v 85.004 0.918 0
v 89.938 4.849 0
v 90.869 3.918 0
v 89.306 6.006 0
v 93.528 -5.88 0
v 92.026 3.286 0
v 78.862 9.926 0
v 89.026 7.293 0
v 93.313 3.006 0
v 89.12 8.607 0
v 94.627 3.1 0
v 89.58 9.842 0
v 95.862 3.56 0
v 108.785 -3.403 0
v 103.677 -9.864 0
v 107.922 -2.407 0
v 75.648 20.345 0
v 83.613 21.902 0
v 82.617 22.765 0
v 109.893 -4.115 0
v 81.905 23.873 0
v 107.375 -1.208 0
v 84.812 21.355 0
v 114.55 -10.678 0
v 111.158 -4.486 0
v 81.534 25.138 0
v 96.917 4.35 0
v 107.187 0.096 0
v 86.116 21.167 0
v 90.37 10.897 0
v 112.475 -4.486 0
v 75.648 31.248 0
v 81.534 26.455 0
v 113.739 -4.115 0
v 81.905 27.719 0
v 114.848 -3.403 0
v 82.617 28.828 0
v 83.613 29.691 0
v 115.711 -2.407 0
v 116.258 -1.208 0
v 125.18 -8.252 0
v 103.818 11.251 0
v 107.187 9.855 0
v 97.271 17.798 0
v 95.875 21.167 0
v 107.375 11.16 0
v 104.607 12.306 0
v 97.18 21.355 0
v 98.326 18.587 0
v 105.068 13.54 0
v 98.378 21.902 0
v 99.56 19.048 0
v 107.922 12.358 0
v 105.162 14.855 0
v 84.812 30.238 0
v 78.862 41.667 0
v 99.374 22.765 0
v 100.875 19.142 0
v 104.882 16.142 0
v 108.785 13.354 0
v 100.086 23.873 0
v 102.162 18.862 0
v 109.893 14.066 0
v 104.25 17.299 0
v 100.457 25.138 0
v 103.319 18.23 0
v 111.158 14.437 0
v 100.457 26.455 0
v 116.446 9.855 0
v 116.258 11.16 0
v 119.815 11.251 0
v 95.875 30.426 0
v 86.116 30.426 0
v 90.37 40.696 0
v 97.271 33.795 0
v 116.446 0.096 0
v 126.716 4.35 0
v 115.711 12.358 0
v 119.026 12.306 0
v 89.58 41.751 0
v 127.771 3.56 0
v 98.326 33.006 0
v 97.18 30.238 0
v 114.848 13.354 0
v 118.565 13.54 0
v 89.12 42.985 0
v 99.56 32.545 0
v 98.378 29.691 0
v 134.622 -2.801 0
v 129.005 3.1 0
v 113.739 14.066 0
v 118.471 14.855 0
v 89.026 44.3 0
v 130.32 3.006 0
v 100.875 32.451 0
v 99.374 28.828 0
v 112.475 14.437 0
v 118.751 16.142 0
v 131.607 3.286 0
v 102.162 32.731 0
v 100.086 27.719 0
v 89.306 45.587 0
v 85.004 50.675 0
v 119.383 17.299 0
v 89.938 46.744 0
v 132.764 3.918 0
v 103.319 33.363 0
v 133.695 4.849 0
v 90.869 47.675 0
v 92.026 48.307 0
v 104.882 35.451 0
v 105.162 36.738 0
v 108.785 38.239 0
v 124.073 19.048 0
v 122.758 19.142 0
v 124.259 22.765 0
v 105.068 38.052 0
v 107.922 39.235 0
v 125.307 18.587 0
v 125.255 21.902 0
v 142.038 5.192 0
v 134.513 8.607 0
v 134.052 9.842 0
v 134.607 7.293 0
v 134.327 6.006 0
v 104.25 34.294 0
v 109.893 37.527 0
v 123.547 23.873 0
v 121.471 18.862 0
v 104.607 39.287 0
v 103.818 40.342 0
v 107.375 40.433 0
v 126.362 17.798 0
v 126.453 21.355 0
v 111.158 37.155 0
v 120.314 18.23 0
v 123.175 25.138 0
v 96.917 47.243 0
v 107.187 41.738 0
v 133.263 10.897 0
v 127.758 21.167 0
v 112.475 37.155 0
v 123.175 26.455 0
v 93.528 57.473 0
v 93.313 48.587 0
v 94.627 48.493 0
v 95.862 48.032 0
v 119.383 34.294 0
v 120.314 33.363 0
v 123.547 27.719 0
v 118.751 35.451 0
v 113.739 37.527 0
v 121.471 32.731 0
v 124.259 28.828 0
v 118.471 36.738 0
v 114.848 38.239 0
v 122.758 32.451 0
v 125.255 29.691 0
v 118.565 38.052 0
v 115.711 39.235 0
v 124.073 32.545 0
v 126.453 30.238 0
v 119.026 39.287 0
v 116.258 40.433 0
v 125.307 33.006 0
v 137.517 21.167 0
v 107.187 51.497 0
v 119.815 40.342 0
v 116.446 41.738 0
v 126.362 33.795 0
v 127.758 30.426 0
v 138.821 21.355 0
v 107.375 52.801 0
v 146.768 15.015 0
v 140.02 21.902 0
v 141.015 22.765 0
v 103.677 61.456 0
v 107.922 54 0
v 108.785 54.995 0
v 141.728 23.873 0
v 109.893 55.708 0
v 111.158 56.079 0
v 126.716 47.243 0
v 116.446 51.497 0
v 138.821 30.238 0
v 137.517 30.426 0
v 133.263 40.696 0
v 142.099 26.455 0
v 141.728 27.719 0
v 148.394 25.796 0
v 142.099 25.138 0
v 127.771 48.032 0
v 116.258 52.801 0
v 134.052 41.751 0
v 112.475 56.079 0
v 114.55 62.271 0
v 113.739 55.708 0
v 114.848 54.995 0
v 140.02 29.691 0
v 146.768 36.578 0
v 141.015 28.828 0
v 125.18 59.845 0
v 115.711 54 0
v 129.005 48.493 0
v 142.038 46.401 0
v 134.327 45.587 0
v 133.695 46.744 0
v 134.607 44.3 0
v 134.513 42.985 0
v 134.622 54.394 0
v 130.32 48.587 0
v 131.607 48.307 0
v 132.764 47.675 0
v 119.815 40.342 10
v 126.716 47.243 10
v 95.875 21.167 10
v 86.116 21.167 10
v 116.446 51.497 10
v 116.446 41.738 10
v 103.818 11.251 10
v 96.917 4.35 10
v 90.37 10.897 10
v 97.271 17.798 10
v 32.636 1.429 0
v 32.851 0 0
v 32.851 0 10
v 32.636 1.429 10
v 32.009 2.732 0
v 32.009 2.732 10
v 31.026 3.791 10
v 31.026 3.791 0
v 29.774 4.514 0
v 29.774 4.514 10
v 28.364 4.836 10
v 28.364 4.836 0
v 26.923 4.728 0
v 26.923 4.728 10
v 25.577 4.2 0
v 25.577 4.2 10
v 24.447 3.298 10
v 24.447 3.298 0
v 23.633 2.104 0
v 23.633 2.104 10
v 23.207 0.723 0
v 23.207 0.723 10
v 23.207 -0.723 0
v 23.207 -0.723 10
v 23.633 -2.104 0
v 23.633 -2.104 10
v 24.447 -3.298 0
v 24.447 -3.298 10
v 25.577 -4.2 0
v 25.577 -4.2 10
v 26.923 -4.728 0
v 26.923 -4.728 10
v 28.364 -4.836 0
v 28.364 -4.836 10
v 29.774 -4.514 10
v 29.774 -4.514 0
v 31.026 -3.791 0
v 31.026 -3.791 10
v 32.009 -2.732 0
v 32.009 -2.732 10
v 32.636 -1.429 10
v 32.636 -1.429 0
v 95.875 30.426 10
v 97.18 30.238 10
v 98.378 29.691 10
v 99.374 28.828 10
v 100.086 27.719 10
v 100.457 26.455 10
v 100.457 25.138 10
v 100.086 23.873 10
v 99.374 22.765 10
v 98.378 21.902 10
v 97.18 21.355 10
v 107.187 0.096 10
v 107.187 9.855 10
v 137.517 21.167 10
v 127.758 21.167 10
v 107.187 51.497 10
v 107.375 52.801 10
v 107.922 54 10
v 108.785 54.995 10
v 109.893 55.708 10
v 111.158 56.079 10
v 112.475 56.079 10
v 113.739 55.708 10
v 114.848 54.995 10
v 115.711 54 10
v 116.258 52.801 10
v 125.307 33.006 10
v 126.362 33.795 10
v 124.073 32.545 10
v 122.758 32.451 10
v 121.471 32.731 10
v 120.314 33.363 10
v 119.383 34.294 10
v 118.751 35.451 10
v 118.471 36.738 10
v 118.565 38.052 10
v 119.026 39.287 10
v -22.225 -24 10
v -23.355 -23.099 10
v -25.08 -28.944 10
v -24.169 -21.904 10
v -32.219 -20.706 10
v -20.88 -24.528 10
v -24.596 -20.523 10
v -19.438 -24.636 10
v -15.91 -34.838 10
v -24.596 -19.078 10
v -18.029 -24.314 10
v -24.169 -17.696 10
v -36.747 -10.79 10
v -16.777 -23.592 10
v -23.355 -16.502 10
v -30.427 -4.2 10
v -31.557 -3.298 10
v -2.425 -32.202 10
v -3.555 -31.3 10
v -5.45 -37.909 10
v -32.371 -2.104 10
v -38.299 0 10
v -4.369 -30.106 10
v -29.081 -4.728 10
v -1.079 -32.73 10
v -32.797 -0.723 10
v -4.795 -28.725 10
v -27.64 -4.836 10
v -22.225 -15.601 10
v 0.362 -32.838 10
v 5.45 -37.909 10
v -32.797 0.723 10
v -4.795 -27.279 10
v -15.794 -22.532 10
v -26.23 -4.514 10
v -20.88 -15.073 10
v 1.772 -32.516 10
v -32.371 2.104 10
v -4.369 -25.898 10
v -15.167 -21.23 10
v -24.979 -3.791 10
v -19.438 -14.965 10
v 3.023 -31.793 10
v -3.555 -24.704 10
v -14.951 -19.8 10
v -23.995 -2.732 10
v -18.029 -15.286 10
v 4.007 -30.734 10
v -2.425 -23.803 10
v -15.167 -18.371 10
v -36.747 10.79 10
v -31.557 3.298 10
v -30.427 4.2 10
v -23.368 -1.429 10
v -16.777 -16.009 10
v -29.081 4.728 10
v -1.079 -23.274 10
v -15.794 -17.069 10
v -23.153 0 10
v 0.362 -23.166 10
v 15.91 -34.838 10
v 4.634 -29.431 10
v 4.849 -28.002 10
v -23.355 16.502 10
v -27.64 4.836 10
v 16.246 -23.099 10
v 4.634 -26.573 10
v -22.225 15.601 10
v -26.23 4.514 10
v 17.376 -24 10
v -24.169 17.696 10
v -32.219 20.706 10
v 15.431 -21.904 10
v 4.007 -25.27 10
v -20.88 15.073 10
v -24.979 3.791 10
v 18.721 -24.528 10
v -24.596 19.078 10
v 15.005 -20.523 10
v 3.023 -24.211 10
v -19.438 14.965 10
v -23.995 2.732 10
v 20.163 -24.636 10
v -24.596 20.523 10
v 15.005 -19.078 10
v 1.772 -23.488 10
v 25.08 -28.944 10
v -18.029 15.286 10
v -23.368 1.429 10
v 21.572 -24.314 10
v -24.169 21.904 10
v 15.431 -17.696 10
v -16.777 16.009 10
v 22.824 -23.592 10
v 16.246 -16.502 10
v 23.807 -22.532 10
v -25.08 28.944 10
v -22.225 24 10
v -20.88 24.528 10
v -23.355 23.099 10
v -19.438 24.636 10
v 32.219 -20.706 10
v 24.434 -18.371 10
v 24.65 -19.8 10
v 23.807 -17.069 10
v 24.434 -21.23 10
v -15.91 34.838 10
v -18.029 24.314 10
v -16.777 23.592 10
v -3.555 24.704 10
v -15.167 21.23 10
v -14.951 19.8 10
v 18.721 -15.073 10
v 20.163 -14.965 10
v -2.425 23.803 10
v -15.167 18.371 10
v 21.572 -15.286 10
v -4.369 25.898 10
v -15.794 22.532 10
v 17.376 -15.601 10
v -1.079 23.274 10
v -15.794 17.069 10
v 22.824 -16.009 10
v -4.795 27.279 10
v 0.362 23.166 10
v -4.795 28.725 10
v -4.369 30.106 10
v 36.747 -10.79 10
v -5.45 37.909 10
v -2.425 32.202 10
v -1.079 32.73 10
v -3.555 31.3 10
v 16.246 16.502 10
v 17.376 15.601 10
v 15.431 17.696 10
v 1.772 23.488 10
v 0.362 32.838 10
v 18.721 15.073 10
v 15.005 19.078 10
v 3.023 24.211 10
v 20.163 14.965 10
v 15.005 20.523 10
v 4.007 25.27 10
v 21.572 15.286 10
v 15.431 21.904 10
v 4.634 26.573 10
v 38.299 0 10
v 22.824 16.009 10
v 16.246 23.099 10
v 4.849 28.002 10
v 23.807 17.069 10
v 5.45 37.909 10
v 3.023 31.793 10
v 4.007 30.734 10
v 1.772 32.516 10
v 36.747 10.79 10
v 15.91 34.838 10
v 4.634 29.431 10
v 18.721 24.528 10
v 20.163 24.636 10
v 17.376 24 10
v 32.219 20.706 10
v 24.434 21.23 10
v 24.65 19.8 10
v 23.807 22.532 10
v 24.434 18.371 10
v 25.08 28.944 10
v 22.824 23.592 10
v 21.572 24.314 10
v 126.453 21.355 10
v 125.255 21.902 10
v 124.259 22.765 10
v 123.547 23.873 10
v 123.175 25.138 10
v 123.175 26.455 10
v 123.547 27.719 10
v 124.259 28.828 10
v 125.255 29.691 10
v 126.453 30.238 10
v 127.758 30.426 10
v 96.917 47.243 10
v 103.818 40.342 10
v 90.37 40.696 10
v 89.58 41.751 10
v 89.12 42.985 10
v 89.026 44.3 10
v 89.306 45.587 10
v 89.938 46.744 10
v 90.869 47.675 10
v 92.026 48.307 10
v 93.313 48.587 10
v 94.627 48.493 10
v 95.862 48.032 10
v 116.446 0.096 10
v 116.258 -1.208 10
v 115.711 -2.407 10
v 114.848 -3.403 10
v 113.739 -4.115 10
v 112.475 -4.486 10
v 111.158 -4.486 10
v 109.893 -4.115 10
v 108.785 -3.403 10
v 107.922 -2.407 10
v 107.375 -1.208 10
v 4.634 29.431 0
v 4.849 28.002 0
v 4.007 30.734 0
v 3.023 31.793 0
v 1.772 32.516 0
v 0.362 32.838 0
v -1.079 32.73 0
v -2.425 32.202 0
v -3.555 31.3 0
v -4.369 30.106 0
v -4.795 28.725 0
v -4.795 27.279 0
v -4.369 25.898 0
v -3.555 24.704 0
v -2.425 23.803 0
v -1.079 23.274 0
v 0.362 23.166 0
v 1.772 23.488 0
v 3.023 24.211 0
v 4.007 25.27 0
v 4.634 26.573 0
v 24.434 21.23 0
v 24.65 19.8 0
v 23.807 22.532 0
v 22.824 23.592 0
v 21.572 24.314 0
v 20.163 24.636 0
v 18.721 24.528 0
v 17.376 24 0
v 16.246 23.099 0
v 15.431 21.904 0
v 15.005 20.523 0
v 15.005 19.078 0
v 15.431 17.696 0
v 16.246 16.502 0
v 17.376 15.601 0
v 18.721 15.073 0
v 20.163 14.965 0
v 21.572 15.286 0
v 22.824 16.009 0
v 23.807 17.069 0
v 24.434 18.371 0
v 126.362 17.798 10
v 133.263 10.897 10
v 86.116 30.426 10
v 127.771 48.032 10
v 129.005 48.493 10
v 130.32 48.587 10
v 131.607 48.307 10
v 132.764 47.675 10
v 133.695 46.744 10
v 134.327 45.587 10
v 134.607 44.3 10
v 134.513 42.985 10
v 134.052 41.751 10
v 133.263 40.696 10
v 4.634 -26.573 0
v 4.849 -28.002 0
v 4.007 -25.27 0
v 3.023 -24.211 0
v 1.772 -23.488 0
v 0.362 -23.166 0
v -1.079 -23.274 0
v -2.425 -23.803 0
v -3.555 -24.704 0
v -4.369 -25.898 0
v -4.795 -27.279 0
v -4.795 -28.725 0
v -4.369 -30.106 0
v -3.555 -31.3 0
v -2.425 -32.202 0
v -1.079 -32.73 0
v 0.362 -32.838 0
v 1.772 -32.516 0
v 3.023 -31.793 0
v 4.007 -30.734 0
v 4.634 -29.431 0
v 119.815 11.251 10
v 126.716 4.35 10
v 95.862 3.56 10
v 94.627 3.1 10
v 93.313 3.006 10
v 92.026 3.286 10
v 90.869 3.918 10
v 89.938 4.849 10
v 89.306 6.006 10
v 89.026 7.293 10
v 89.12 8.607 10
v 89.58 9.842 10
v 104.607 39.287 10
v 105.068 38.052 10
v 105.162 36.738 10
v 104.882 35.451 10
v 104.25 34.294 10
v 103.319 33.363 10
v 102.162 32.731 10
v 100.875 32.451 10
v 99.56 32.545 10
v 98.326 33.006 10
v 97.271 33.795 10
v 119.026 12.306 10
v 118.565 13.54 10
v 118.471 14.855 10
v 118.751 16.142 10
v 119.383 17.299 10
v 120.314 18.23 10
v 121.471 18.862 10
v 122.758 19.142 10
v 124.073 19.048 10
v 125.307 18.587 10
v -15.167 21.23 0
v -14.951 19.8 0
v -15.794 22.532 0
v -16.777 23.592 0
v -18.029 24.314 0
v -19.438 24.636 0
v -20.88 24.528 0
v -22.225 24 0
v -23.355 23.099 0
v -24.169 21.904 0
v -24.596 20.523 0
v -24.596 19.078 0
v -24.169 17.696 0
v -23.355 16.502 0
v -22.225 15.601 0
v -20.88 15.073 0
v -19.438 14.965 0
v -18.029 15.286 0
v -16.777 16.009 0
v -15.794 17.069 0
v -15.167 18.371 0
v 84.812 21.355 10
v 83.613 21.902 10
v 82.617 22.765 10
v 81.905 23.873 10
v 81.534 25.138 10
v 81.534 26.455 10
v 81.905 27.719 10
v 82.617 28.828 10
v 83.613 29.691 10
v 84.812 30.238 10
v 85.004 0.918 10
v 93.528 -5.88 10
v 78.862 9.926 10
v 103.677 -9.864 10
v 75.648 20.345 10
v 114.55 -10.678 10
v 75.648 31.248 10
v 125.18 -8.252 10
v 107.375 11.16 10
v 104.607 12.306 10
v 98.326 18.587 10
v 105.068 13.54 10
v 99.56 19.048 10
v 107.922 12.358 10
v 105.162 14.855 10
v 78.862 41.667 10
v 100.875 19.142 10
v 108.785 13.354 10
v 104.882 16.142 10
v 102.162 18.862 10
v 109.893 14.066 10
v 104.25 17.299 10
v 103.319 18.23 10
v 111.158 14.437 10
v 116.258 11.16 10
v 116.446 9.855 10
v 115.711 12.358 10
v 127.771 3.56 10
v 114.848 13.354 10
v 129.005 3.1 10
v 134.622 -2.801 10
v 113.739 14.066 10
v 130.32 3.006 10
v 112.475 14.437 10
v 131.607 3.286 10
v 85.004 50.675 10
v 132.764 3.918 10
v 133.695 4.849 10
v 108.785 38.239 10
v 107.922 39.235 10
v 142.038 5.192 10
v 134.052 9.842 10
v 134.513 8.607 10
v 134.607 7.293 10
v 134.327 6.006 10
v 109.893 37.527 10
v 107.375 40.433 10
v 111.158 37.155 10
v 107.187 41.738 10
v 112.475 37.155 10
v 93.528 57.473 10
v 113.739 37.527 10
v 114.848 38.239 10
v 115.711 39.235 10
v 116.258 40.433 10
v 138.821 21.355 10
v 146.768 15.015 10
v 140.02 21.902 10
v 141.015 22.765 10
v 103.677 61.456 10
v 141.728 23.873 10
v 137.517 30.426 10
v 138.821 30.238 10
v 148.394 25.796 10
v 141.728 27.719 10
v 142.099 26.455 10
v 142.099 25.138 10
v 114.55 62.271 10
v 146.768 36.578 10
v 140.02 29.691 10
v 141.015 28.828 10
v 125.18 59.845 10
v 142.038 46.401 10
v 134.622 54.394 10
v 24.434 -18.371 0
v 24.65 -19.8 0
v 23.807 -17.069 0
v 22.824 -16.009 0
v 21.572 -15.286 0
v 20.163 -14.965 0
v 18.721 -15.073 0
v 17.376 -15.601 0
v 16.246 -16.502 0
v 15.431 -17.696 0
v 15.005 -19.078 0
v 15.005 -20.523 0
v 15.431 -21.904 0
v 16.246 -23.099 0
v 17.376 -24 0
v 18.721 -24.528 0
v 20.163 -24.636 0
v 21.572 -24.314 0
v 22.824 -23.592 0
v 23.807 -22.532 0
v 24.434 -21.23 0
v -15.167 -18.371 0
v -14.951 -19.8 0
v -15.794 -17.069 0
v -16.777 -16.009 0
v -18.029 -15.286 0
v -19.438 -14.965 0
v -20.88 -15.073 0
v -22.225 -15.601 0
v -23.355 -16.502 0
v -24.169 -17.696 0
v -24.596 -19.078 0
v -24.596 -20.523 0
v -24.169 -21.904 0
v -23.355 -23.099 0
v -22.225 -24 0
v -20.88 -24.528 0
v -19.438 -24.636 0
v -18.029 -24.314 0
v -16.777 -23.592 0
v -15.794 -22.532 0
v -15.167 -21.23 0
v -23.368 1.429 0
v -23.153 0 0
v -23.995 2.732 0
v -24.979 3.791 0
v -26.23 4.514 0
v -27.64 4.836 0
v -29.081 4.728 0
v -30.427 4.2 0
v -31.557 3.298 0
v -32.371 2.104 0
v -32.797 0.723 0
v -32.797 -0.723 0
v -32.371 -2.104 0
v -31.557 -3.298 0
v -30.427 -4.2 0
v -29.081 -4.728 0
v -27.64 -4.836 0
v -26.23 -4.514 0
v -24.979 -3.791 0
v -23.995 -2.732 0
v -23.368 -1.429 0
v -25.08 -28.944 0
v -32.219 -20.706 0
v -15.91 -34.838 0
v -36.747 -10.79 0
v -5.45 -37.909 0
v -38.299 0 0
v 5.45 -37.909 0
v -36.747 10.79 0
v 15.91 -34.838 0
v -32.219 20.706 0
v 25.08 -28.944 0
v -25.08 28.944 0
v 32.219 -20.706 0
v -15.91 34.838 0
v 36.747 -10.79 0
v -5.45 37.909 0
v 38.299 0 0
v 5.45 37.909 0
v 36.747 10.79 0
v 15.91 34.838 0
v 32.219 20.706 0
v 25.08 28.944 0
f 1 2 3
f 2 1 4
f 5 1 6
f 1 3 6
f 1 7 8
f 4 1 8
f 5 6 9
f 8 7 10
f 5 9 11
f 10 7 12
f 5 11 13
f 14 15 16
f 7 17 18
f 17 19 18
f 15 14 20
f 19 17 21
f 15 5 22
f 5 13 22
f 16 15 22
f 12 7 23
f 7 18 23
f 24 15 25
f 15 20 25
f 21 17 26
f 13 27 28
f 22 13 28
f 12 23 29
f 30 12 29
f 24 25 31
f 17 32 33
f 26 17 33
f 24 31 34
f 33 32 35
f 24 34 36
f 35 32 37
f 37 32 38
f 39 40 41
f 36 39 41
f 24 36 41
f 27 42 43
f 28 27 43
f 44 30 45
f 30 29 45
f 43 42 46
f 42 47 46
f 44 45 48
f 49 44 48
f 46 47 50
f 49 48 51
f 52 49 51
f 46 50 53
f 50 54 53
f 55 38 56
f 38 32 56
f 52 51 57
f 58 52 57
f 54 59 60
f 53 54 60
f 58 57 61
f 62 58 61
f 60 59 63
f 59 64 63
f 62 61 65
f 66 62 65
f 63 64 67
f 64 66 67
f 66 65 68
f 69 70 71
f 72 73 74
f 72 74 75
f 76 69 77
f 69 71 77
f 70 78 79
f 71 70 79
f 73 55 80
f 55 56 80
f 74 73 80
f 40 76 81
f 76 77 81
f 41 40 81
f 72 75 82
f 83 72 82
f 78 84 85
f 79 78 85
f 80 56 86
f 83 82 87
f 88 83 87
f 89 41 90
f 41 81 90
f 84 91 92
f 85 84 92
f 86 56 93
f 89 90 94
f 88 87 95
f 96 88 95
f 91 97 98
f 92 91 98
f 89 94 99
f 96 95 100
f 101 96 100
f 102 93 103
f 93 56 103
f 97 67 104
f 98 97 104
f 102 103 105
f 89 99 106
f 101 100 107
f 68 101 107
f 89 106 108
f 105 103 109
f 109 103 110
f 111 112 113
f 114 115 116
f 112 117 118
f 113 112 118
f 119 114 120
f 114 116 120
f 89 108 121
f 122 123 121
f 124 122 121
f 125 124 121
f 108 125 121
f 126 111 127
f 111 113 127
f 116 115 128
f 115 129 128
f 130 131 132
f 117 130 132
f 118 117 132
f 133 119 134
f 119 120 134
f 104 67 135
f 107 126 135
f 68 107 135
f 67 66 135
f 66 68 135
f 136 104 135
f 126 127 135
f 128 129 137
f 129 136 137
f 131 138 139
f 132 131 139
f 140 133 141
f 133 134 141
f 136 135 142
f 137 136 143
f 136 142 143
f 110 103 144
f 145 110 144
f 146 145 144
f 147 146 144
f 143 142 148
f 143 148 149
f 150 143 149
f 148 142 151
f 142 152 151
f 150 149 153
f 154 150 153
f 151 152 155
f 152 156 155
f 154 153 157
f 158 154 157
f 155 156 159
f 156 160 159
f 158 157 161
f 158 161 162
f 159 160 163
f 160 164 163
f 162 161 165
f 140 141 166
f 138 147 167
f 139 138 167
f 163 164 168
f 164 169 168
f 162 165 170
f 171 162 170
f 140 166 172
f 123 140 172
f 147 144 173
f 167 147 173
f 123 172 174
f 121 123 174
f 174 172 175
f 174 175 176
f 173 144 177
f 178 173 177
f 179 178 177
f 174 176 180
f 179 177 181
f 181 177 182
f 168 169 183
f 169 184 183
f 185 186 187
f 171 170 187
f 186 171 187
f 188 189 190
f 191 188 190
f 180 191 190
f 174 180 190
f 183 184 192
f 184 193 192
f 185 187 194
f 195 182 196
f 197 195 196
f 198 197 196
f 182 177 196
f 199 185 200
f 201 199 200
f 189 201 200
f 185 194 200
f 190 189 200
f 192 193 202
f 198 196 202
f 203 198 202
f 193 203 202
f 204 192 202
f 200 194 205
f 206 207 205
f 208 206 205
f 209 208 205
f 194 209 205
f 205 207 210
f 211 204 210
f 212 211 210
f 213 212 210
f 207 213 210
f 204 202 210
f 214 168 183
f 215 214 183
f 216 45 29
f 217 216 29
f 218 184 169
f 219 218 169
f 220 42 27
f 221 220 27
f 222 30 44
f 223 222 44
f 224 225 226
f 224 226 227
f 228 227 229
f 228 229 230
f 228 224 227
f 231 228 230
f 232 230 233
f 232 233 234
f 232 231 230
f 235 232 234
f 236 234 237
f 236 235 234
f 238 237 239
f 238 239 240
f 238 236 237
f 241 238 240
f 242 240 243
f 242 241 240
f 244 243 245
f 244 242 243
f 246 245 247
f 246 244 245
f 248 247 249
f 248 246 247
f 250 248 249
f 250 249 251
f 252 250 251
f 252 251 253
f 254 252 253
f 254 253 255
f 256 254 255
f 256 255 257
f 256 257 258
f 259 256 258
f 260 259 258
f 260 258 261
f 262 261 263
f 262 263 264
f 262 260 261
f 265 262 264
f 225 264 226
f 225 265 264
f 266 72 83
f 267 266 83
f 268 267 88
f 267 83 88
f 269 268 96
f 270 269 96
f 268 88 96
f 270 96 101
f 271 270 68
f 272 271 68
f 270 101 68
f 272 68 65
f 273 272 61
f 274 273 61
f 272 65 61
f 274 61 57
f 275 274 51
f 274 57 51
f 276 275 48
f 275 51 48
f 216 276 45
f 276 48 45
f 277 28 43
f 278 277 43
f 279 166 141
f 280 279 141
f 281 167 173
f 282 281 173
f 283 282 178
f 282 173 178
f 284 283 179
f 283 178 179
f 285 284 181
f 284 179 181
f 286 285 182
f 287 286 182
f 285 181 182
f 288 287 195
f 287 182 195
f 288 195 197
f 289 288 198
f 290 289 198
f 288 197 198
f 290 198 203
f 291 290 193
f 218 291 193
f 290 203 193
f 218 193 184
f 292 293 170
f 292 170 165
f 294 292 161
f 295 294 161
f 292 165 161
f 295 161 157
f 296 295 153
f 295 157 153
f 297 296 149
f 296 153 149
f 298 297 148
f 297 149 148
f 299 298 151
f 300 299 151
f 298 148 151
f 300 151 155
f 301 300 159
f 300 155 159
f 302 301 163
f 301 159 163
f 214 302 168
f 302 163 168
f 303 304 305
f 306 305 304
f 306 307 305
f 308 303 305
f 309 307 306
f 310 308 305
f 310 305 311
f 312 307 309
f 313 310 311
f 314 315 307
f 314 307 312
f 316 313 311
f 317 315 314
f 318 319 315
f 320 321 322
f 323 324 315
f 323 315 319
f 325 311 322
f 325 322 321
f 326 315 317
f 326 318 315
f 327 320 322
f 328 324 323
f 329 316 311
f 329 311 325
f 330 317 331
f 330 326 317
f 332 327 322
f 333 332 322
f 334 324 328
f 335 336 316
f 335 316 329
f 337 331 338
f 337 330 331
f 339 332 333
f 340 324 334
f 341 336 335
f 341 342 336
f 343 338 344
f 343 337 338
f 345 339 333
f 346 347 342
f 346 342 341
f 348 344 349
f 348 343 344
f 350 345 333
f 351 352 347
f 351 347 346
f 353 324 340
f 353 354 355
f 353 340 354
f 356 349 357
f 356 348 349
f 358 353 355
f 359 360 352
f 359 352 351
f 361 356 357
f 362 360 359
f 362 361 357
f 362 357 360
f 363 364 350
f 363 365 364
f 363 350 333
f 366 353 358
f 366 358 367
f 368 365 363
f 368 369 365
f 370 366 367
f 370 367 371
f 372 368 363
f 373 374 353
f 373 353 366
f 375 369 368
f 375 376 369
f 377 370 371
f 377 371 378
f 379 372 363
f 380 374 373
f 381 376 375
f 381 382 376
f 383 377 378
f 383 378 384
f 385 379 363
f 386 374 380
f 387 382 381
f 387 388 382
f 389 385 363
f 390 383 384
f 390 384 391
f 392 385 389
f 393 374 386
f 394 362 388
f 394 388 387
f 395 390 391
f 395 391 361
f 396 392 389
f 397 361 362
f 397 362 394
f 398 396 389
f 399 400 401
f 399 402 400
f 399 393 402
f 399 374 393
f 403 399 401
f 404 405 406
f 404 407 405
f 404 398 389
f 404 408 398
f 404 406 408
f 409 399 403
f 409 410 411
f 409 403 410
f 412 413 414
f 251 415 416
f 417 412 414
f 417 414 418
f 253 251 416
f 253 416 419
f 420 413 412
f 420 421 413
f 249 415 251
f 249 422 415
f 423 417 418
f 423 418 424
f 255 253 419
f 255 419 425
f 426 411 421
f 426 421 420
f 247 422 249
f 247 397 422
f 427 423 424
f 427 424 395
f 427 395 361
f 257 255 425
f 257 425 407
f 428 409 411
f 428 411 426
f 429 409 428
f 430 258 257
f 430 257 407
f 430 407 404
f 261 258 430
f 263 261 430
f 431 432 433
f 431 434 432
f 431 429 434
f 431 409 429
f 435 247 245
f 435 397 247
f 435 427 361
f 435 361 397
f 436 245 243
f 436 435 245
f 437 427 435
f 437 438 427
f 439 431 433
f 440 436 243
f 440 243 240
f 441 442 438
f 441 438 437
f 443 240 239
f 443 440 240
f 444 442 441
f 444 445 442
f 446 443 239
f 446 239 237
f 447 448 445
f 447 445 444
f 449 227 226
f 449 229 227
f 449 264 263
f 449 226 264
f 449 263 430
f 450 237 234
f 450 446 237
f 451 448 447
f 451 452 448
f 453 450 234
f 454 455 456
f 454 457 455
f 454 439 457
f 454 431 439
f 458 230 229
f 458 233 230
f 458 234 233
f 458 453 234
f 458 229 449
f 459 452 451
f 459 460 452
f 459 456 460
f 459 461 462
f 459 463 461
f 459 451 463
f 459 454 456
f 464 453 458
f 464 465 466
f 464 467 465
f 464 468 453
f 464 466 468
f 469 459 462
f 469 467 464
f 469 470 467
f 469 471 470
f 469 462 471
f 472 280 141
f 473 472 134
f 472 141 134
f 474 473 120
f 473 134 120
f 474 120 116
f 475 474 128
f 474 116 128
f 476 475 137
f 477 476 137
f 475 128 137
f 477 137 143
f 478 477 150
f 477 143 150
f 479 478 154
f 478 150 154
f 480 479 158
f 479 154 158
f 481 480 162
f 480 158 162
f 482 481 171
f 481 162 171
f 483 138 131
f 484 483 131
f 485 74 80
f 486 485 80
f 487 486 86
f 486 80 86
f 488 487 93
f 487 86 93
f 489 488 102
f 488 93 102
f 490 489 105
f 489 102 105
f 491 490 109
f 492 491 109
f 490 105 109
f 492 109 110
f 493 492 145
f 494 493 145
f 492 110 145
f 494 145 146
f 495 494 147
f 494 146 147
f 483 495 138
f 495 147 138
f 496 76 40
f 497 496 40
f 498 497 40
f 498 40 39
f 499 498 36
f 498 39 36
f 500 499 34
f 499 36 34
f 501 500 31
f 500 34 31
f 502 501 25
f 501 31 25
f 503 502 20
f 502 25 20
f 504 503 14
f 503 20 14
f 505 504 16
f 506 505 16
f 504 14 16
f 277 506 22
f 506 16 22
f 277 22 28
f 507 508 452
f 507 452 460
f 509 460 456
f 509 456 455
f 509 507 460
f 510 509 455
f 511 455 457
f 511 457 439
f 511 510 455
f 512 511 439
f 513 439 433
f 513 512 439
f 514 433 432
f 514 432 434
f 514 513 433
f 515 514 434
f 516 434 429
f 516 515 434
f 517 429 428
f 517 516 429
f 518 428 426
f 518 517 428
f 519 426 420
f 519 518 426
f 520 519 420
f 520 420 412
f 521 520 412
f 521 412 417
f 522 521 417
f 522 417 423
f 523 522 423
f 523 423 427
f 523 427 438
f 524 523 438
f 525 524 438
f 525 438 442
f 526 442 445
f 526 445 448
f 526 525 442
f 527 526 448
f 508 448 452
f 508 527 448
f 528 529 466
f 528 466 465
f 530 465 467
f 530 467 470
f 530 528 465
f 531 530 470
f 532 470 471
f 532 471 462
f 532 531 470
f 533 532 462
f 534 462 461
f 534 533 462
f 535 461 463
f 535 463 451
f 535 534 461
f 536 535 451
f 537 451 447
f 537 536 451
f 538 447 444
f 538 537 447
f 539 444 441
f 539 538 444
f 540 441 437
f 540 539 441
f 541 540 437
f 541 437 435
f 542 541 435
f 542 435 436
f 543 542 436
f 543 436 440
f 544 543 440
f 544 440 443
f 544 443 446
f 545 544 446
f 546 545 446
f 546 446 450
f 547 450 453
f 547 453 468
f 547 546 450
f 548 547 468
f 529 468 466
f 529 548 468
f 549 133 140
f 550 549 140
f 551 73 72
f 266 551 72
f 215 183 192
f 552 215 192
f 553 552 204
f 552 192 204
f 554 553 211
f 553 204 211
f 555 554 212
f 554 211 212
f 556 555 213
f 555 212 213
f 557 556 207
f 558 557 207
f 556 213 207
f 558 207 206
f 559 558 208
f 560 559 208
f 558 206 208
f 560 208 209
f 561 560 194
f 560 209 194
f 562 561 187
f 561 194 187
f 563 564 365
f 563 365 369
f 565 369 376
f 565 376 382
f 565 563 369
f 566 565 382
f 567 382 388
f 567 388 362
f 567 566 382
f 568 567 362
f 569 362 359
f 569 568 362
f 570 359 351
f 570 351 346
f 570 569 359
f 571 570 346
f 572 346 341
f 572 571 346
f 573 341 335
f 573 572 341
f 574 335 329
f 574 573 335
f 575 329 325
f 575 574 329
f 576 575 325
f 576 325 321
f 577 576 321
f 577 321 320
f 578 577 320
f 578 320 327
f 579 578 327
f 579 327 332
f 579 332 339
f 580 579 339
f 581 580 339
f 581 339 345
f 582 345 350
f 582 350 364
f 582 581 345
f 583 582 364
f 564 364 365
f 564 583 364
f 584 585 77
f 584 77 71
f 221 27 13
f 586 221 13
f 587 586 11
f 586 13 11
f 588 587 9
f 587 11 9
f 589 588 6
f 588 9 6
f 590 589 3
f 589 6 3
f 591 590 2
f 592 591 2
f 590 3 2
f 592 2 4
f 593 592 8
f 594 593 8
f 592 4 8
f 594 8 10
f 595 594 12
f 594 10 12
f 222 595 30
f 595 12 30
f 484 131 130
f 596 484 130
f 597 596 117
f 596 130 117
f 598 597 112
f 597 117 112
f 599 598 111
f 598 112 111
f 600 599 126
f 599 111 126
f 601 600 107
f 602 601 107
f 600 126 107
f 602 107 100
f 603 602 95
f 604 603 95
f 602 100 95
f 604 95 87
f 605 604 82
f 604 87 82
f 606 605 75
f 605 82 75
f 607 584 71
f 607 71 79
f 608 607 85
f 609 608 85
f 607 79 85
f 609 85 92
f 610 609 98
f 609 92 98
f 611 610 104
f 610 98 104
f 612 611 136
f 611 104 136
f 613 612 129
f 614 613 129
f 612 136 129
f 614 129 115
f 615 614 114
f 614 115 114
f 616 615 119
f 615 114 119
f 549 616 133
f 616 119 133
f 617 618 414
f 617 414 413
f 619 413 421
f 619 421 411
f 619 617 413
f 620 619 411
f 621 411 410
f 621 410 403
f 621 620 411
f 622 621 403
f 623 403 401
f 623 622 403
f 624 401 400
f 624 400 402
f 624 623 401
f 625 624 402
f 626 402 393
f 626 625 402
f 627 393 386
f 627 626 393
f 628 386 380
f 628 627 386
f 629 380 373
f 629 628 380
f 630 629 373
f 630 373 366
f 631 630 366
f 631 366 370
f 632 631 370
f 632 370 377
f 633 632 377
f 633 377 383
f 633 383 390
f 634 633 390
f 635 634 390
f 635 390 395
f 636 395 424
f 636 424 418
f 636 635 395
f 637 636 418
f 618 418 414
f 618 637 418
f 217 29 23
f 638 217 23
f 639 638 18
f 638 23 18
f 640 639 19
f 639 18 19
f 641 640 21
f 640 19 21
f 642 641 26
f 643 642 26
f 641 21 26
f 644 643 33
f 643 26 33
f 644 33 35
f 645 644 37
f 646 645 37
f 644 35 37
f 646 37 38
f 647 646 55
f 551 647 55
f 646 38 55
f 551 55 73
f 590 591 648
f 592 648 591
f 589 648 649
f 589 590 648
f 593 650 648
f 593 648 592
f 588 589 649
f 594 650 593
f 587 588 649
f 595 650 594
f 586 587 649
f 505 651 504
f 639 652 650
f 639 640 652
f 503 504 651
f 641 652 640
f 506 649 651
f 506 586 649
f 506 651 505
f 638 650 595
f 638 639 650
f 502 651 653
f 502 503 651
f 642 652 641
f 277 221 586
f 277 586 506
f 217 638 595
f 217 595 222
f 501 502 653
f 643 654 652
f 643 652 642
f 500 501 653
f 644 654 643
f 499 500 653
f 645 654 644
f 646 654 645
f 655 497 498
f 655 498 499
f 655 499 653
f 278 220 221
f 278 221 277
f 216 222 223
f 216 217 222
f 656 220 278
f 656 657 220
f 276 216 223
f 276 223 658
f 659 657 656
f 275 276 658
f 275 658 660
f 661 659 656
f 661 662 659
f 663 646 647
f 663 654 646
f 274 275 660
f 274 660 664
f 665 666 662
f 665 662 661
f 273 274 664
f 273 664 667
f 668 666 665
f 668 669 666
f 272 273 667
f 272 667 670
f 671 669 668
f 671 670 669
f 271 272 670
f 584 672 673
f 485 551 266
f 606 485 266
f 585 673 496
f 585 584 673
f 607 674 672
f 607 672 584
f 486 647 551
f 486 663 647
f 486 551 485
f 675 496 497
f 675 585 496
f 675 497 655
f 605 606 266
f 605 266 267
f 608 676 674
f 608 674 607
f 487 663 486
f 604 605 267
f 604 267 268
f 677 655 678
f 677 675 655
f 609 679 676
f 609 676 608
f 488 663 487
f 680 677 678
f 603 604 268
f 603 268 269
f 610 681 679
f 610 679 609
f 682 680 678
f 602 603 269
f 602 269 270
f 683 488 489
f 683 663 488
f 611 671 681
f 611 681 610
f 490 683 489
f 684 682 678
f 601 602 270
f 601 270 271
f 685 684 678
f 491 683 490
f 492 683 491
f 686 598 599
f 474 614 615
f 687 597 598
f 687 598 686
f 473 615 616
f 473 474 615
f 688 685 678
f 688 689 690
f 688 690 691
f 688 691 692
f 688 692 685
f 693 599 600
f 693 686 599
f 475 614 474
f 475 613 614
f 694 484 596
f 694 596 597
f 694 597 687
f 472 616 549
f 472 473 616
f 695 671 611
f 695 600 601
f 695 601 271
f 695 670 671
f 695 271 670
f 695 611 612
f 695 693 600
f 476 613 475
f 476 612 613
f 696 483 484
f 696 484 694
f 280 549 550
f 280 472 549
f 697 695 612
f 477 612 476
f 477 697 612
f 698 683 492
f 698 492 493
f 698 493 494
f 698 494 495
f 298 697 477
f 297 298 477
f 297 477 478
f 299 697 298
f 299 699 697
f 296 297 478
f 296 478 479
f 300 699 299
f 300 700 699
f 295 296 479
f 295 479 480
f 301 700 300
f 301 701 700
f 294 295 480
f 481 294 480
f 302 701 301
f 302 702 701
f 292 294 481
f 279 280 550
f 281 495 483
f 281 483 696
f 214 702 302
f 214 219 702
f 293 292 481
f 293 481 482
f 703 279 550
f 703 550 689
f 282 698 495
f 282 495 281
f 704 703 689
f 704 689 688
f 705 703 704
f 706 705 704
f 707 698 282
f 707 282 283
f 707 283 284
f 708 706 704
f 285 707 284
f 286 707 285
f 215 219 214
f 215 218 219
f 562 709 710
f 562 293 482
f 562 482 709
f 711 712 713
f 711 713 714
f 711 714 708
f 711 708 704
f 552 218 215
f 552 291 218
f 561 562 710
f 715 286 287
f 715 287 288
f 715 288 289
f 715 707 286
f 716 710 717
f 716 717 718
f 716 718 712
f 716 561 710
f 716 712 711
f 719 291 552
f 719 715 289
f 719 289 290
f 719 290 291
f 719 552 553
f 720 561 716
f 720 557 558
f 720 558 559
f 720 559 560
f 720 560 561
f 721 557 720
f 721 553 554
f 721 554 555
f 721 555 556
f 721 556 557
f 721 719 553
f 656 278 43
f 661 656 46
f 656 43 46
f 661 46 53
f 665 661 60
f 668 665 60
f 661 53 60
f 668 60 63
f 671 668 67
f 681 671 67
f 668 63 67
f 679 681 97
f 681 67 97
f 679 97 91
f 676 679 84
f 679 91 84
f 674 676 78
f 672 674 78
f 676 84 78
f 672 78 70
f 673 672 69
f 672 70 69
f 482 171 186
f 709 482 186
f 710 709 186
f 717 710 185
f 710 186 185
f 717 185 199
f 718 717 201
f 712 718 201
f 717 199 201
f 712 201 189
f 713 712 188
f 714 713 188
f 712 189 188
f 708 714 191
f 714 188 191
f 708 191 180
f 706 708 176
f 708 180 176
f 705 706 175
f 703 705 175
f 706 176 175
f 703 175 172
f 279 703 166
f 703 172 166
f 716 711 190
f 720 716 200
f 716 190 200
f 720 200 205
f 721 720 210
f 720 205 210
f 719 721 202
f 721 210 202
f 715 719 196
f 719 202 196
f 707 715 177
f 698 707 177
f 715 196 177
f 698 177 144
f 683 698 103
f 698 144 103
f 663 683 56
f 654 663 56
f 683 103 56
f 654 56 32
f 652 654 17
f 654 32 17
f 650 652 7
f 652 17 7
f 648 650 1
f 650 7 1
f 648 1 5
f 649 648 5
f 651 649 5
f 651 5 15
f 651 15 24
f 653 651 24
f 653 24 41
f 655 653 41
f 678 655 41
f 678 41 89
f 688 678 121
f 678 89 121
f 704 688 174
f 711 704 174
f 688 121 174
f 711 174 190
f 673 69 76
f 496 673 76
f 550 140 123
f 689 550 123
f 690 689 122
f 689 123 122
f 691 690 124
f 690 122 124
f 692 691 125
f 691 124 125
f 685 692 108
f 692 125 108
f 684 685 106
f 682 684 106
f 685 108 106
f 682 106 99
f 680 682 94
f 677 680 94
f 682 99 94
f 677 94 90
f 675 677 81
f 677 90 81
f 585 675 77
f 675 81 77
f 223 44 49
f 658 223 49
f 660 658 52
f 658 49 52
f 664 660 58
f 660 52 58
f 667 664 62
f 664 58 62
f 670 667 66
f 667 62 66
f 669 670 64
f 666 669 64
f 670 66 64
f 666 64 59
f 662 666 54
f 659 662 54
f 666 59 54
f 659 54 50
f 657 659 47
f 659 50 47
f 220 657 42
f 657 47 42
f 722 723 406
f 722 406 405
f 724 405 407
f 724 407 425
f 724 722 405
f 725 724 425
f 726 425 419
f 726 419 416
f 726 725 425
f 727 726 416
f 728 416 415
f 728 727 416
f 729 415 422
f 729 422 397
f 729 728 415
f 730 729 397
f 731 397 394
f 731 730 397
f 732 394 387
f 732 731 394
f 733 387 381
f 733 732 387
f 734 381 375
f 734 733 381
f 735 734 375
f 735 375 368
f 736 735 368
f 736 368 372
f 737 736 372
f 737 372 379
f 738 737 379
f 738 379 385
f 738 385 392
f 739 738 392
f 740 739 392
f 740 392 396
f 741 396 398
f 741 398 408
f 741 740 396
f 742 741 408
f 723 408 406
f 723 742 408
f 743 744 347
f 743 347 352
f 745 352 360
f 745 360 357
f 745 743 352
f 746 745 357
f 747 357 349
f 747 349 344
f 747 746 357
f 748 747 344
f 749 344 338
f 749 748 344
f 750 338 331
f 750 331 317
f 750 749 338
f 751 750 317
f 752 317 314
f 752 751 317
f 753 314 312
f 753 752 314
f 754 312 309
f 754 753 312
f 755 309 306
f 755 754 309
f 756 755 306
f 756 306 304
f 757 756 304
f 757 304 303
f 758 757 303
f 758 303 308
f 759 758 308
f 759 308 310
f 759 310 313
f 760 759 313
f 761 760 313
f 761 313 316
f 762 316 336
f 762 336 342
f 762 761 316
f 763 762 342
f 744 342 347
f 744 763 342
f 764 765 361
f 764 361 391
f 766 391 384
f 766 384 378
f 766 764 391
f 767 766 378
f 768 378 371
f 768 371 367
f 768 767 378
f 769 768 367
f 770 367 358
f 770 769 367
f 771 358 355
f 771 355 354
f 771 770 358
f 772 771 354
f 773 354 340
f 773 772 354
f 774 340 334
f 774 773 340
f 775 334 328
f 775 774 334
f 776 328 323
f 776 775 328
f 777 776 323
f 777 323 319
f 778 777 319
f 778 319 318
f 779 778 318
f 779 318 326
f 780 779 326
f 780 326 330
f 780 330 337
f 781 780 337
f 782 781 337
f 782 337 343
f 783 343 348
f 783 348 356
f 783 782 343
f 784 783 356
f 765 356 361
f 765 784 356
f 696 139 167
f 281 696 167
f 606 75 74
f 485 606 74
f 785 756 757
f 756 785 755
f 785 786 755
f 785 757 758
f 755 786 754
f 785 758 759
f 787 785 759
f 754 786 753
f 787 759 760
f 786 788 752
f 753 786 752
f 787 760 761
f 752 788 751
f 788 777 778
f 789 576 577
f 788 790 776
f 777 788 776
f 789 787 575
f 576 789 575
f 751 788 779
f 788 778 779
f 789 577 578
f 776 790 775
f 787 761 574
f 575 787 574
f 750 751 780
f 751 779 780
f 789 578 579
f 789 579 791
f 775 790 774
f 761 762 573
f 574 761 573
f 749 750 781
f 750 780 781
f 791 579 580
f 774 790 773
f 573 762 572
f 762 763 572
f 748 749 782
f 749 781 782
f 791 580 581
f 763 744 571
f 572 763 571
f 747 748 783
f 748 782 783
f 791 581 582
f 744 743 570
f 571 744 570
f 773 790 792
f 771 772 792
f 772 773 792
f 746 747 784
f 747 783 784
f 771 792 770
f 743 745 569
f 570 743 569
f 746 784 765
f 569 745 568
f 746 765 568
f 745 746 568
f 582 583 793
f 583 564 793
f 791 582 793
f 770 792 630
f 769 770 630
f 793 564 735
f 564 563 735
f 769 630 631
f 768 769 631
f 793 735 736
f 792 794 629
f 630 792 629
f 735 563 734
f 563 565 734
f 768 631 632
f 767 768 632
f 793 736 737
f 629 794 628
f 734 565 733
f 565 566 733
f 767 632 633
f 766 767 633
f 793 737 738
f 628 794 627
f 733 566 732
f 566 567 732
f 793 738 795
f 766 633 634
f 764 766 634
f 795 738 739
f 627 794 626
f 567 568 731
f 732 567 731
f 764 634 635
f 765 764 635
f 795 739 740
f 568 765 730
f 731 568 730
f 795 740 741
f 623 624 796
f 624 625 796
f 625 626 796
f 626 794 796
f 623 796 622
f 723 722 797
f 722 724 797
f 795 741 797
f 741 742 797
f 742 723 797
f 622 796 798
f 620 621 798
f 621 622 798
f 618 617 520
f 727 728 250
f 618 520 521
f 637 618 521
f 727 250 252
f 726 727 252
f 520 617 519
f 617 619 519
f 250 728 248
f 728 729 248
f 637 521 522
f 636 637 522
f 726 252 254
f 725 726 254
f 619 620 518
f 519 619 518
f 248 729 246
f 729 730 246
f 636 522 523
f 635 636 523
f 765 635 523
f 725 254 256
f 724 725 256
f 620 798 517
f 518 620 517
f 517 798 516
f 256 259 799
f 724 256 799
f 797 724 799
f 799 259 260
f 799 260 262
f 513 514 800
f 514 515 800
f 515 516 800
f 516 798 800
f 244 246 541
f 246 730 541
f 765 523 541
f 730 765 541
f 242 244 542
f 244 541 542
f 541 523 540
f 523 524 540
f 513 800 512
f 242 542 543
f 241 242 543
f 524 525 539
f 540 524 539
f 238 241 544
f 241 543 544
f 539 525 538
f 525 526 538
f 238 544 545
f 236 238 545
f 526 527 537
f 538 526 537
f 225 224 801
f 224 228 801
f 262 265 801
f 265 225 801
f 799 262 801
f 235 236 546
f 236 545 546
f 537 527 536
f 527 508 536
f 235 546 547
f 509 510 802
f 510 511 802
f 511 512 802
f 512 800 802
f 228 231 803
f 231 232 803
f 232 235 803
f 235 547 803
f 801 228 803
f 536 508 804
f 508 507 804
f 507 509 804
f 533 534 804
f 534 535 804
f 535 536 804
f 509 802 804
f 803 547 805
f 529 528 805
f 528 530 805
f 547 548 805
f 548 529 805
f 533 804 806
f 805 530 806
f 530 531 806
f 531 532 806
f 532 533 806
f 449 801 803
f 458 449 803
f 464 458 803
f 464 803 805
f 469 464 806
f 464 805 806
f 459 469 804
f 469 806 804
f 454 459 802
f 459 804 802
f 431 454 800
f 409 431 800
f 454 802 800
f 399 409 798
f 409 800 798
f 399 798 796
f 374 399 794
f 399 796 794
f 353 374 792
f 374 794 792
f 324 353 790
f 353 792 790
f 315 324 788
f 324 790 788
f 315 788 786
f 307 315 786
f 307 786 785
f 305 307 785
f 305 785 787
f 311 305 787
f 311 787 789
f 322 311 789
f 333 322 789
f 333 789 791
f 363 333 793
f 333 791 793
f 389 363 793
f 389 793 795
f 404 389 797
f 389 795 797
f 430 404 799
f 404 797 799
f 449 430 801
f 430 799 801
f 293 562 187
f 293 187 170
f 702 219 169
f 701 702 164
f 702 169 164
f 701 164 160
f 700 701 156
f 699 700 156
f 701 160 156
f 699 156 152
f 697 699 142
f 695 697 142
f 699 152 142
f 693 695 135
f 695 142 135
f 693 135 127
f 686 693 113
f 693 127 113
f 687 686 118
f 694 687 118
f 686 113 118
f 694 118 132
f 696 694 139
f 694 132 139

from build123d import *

# Parameters (mm, degrees)
SKETCH1_R             = 38.298642763
SKETCH1_R_2           = 4.849226706
BOSS_EXTRUDE1_DEPTH   = 10
SKETCH1_R_3           = 36.577057953
BOSS_EXTRUDE1_2_DEPTH = 10


with BuildPart() as part:
    # Sketch1 → Boss-Extrude1 (new body)
    with BuildSketch(Plane.XY):
        Circle(SKETCH1_R)
        with Locations((28.002059603, 0)):
            Circle(SKETCH1_R_2, mode=Mode.SUBTRACT)
        with Locations((19.800446232, -19.800446232)):
            Circle(SKETCH1_R_2, mode=Mode.SUBTRACT)
        with Locations((0, -28.002059603)):
            Circle(SKETCH1_R_2, mode=Mode.SUBTRACT)
        with Locations((-19.800446232, -19.800446232)):
            Circle(SKETCH1_R_2, mode=Mode.SUBTRACT)
        with Locations((-28.002059603, 0)):
            Circle(SKETCH1_R_2, mode=Mode.SUBTRACT)
        with Locations((-19.800446232, 19.800446232)):
            Circle(SKETCH1_R_2, mode=Mode.SUBTRACT)
        with Locations((0, 28.002059603)):
            Circle(SKETCH1_R_2, mode=Mode.SUBTRACT)
        with Locations((19.800446232, 19.800446232)):
            Circle(SKETCH1_R_2, mode=Mode.SUBTRACT)
    extrude(amount=BOSS_EXTRUDE1_DEPTH)


with BuildPart() as body_2:
    # Sketch1 → Boss-Extrude1 2 (new body)
    with BuildSketch(Plane.XY):
        with Locations((111.816443481, 25.796417922)):
            Circle(SKETCH1_R_3)
        with BuildLine():
            Line((127.757552755, 30.425601298), (137.516963938, 30.425601298))
            ThreePointArc((137.516963938, 30.425601298), (142.146147315, 25.796417922), (137.516963938, 21.167234545))
            Line((137.516963938, 21.167234545), (127.757552755, 21.167234545))
            ThreePointArc((127.757552755, 21.167234545), (123.128369378, 25.796417922), (127.757552755, 30.425601298))
        make_face(mode=Mode.SUBTRACT)
        with BuildLine():
            Line((126.361836905, 17.797678412), (133.262782733, 10.896732583))
            ThreePointArc((133.262782733, 10.896732583), (133.262782733, 4.35007867), (126.71612882, 4.35007867))
            Line((126.71612882, 4.35007867), (119.815182991, 11.251024498))
            ThreePointArc((119.815182991, 11.251024498), (119.815182991, 17.797678412), (126.361836905, 17.797678412))
        make_face(mode=Mode.SUBTRACT)
        with BuildLine():
            Line((116.445626858, 9.855308648), (116.445626858, 0.095897464))
            ThreePointArc((116.445626858, 0.095897464), (111.816443481, -4.533285912), (107.187260105, 0.095897464))
            Line((107.187260105, 0.095897464), (107.187260105, 9.855308648))
            ThreePointArc((107.187260105, 9.855308648), (111.816443481, 14.484492025), (116.445626858, 9.855308648))
        make_face(mode=Mode.SUBTRACT)
        with BuildLine():
            Line((103.817703971, 11.251024498), (96.916758143, 4.35007867))
            ThreePointArc((96.916758143, 4.35007867), (90.370104229, 4.35007867), (90.370104229, 10.896732583))
            Line((90.370104229, 10.896732583), (97.271050058, 17.797678412))
            ThreePointArc((97.271050058, 17.797678412), (103.817703971, 17.797678412), (103.817703971, 11.251024498))
        make_face(mode=Mode.SUBTRACT)
        with BuildLine():
            Line((95.875334208, 21.167234545), (86.115923024, 21.167234545))
            ThreePointArc((86.115923024, 21.167234545), (81.486739648, 25.796417922), (86.115923024, 30.425601298))
            Line((86.115923024, 30.425601298), (95.875334208, 30.425601298))
            ThreePointArc((95.875334208, 30.425601298), (100.504517584, 25.796417922), (95.875334208, 21.167234545))
        make_face(mode=Mode.SUBTRACT)
        with BuildLine():
            Line((97.271050058, 33.795157432), (90.370104229, 40.69610326))
            ThreePointArc((90.370104229, 40.69610326), (90.370104229, 47.242757173), (96.916758143, 47.242757173))
            Line((96.916758143, 47.242757173), (103.817703971, 40.341811345))
            ThreePointArc((103.817703971, 40.341811345), (103.817703971, 33.795157432), (97.271050058, 33.795157432))
        make_face(mode=Mode.SUBTRACT)
        with BuildLine():
            Line((107.187260105, 41.737527195), (107.187260105, 51.496938379))
            ThreePointArc((107.187260105, 51.496938379), (111.816443481, 56.126121755), (116.445626858, 51.496938379))
            Line((116.445626858, 51.496938379), (116.445626858, 41.737527195))
            ThreePointArc((116.445626858, 41.737527195), (111.816443481, 37.108343818), (107.187260105, 41.737527195))
        make_face(mode=Mode.SUBTRACT)
        with BuildLine():
            Line((119.815182991, 40.341811345), (126.71612882, 47.242757173))
            ThreePointArc((126.71612882, 47.242757173), (133.262782733, 47.242757173), (133.262782733, 40.69610326))
            Line((133.262782733, 40.69610326), (126.361836905, 33.795157432))
            ThreePointArc((126.361836905, 33.795157432), (119.815182991, 33.795157432), (119.815182991, 40.341811345))
        make_face(mode=Mode.SUBTRACT)
    extrude(amount=BOSS_EXTRUDE1_2_DEPTH)


solid = Compound([part.part, body_2.part])
